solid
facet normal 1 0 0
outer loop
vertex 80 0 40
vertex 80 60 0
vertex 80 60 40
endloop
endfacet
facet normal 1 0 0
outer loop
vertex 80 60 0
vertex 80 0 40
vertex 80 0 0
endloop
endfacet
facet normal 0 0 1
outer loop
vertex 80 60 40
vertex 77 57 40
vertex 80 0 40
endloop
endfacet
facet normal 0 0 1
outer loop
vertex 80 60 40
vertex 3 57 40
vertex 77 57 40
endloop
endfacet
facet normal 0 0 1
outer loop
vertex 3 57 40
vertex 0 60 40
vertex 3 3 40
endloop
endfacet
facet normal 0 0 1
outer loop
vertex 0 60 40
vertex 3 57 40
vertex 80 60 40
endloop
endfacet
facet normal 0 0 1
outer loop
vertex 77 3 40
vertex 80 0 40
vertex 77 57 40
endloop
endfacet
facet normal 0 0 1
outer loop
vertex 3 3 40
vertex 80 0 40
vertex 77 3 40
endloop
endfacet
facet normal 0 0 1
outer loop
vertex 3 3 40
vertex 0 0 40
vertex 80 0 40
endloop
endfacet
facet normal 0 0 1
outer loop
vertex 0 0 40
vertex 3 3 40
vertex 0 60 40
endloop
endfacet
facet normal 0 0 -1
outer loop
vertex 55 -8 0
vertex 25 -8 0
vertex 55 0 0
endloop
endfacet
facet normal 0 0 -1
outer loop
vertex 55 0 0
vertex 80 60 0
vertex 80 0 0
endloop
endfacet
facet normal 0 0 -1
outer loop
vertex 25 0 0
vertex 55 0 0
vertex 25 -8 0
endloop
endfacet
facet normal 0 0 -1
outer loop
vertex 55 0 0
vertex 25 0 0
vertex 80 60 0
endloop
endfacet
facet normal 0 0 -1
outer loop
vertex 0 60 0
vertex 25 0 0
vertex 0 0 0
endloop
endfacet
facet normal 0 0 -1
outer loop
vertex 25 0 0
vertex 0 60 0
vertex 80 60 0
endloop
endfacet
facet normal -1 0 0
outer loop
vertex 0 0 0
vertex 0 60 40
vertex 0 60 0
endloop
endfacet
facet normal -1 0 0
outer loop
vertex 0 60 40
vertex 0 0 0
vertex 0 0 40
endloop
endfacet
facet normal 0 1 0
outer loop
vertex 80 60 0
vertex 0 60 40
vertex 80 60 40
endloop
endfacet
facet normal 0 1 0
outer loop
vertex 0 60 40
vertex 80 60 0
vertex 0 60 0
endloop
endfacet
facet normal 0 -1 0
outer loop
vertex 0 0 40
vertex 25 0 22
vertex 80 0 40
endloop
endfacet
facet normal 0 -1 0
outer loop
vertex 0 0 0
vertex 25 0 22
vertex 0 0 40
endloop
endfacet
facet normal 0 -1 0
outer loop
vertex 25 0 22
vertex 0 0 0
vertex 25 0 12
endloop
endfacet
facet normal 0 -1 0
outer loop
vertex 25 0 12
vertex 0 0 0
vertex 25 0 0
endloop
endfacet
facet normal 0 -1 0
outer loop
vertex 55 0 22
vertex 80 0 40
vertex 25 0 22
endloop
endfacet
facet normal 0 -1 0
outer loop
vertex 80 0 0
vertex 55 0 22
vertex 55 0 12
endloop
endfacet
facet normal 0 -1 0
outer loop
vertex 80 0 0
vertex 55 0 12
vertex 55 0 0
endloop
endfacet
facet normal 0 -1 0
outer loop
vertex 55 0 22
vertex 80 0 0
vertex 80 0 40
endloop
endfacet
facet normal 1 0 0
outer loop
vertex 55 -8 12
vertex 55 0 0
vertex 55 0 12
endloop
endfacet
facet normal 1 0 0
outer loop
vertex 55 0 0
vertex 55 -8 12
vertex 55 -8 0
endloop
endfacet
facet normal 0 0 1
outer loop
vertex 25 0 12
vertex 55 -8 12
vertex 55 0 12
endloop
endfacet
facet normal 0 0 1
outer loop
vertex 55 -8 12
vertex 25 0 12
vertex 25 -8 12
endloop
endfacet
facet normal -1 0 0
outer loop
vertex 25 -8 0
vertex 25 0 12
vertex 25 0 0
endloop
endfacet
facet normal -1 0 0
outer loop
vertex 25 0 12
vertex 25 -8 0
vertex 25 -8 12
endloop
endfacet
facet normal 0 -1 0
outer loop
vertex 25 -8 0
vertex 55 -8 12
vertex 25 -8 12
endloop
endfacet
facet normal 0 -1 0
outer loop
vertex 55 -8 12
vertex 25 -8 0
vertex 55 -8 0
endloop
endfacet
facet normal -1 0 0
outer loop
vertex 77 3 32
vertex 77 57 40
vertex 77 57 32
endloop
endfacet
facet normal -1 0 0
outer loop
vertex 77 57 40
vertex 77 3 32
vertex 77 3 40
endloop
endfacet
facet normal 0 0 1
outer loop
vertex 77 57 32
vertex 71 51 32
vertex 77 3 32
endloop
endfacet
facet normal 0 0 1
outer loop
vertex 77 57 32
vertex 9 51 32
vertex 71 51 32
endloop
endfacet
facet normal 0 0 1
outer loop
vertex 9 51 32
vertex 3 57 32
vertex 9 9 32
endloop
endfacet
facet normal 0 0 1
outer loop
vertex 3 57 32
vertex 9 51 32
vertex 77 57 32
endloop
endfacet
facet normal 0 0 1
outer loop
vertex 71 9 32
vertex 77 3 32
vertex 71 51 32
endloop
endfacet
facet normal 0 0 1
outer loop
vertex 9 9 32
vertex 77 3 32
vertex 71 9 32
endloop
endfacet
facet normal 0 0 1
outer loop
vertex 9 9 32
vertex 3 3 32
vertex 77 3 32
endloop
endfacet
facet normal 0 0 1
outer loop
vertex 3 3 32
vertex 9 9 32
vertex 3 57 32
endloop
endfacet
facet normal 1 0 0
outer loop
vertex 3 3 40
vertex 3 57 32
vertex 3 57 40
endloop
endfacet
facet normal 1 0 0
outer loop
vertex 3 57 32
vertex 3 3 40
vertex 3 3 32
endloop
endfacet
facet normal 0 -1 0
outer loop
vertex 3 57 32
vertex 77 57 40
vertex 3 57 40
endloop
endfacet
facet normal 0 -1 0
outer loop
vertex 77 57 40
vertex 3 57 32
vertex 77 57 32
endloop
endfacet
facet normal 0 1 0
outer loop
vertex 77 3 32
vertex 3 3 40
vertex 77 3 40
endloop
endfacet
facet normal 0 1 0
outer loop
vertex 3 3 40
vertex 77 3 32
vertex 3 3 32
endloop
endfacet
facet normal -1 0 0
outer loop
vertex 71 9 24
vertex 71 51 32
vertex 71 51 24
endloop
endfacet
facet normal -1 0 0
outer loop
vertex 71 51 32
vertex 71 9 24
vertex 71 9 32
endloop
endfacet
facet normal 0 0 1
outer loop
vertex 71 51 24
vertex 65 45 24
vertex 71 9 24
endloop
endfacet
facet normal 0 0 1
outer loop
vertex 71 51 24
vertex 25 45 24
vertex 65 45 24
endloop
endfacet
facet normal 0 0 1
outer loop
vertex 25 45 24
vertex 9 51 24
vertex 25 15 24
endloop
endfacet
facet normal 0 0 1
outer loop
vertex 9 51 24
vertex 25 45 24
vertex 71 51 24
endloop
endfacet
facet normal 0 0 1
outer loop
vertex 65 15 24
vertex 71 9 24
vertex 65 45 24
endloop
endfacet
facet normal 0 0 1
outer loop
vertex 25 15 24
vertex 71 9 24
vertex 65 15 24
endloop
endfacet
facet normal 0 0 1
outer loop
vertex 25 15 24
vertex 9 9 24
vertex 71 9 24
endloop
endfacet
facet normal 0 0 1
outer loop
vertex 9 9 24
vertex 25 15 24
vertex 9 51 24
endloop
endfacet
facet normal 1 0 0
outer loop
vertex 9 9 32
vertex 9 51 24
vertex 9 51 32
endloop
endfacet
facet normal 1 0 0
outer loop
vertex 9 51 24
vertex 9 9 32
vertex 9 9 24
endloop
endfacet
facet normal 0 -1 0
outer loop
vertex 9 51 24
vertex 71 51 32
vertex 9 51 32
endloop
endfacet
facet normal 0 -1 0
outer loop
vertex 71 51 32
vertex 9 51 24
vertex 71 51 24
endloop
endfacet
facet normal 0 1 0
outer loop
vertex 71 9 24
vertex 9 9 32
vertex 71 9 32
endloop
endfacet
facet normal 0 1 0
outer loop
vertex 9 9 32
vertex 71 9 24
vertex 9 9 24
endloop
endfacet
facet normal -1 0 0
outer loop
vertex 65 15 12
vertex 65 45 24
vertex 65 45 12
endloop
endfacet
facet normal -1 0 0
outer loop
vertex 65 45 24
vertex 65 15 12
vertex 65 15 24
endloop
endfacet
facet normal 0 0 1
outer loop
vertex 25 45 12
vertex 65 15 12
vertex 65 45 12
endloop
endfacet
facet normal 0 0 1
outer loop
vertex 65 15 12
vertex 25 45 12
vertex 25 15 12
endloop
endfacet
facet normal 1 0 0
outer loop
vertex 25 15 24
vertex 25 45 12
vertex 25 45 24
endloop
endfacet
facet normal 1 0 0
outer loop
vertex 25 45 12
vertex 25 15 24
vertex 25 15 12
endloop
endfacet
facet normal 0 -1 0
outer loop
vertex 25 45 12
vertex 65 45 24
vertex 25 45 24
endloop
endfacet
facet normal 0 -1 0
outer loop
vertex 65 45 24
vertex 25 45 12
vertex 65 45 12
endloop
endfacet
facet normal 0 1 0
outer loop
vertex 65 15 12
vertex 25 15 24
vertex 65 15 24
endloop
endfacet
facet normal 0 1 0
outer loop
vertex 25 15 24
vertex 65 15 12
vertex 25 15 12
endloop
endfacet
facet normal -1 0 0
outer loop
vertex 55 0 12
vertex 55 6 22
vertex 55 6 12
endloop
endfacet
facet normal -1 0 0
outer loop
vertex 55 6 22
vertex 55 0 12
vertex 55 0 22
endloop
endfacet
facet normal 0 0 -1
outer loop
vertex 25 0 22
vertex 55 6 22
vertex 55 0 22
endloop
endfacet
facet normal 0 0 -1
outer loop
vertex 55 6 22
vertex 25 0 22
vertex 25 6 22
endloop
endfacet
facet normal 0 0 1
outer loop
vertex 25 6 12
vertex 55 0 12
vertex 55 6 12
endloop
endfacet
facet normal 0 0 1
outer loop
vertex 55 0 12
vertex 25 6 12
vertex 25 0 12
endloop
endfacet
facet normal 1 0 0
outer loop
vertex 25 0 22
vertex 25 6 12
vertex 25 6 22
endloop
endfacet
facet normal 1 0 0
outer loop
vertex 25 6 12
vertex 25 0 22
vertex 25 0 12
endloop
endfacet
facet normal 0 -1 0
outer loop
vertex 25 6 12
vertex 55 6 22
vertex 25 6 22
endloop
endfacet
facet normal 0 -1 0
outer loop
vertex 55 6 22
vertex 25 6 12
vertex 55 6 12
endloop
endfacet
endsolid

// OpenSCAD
// ============================================================
// Stepped-Pocket Open Box with Side Projection
// All dimensions in millimeters
// ============================================================

// ---------- Overall body ----------
W = 80;                 // overall width  (X)
D = 60;                 // overall depth  (Y)
H = 40;                 // overall height (Z)

// ---------- Wall / rim thicknesses ----------
rim_t  = 3;             // thin rim around the top opening
wall_t = 6;             // wall step between successive recesses

// ---------- Nested pocket depths (cut from the top) ----------
recess1_depth = 8;      // broad upper recess
recess2_depth = 16;     // medium recess
recess3_depth = 28;     // deepest pocket (leaves solid bottom)

// ---------- Deepest pocket geometry ----------
deep_w     = 40;        // deepest pocket width  (X)
deep_d     = 30;        // deepest pocket depth  (Y)
deep_shift = 5;         // side offset of deepest pocket vs. upper recesses

// ---------- Side projection & related side recess ----------
proj_w = 30;            // projection width  (X)
proj_d = 8;             // projection outward depth (Y)
proj_h = 12;            // projection height (Z)
proj_x = 25;            // projection X start
side_recess_d = 6;      // side recess cut depth into the body (Y)
side_recess_h = 10;     // side recess height (Z)

$fn = 64;

// ---------- Derived values ----------
recess1_w = W - 2*rim_t;                 // upper recess plan size
recess1_d = D - 2*rim_t;
recess2_w = recess1_w - 2*wall_t;        // medium recess plan size
recess2_d = recess1_d - 2*wall_t;
deep_x0   = (W - deep_w)/2 + deep_shift; // deepest pocket X start (shifted)
deep_y0   = (D - deep_d)/2;              // deepest pocket Y start

// ============================================================
// Modules
// ============================================================

// Broad upper recess, cutting down from the top face
module upper_recess() {
    translate([rim_t, rim_t, H - recess1_depth])
        cube([recess1_w, recess1_d, recess1_depth + 1]);
}

// Medium recess, inset one wall step and cut deeper
module mid_recess() {
    translate([rim_t + wall_t, rim_t + wall_t, H - recess2_depth])
        cube([recess2_w, recess2_d, recess2_depth + 1]);
}

// Deepest pocket, shifted toward +X to leave uneven ledges
module deep_recess() {
    translate([deep_x0, deep_y0, H - recess3_depth])
        cube([deep_w, deep_d, recess3_depth + 1]);
}

// Added rectangular solid projection on the -Y face
module side_projection() {
    translate([proj_x, -proj_d, 0])
        cube([proj_w, proj_d, proj_h]);
}

// Side recess cut in the -Y wall, tiered directly above the projection
module side_recess_cut() {
    translate([proj_x, 0, proj_h])
        cube([proj_w, side_recess_d, side_recess_h]);
}

// ============================================================
// Assembly
// ============================================================

difference() {
    // Solid body plus the added side projection
    union() {
        cube([W, D, H]);
        side_projection();
    }

    // Interior stepped cavity (open from the top, solid bottom)
    upper_recess();
    mid_recess();
    deep_recess();

    // Stepped side tier above the projection
    side_recess_cut();
}
